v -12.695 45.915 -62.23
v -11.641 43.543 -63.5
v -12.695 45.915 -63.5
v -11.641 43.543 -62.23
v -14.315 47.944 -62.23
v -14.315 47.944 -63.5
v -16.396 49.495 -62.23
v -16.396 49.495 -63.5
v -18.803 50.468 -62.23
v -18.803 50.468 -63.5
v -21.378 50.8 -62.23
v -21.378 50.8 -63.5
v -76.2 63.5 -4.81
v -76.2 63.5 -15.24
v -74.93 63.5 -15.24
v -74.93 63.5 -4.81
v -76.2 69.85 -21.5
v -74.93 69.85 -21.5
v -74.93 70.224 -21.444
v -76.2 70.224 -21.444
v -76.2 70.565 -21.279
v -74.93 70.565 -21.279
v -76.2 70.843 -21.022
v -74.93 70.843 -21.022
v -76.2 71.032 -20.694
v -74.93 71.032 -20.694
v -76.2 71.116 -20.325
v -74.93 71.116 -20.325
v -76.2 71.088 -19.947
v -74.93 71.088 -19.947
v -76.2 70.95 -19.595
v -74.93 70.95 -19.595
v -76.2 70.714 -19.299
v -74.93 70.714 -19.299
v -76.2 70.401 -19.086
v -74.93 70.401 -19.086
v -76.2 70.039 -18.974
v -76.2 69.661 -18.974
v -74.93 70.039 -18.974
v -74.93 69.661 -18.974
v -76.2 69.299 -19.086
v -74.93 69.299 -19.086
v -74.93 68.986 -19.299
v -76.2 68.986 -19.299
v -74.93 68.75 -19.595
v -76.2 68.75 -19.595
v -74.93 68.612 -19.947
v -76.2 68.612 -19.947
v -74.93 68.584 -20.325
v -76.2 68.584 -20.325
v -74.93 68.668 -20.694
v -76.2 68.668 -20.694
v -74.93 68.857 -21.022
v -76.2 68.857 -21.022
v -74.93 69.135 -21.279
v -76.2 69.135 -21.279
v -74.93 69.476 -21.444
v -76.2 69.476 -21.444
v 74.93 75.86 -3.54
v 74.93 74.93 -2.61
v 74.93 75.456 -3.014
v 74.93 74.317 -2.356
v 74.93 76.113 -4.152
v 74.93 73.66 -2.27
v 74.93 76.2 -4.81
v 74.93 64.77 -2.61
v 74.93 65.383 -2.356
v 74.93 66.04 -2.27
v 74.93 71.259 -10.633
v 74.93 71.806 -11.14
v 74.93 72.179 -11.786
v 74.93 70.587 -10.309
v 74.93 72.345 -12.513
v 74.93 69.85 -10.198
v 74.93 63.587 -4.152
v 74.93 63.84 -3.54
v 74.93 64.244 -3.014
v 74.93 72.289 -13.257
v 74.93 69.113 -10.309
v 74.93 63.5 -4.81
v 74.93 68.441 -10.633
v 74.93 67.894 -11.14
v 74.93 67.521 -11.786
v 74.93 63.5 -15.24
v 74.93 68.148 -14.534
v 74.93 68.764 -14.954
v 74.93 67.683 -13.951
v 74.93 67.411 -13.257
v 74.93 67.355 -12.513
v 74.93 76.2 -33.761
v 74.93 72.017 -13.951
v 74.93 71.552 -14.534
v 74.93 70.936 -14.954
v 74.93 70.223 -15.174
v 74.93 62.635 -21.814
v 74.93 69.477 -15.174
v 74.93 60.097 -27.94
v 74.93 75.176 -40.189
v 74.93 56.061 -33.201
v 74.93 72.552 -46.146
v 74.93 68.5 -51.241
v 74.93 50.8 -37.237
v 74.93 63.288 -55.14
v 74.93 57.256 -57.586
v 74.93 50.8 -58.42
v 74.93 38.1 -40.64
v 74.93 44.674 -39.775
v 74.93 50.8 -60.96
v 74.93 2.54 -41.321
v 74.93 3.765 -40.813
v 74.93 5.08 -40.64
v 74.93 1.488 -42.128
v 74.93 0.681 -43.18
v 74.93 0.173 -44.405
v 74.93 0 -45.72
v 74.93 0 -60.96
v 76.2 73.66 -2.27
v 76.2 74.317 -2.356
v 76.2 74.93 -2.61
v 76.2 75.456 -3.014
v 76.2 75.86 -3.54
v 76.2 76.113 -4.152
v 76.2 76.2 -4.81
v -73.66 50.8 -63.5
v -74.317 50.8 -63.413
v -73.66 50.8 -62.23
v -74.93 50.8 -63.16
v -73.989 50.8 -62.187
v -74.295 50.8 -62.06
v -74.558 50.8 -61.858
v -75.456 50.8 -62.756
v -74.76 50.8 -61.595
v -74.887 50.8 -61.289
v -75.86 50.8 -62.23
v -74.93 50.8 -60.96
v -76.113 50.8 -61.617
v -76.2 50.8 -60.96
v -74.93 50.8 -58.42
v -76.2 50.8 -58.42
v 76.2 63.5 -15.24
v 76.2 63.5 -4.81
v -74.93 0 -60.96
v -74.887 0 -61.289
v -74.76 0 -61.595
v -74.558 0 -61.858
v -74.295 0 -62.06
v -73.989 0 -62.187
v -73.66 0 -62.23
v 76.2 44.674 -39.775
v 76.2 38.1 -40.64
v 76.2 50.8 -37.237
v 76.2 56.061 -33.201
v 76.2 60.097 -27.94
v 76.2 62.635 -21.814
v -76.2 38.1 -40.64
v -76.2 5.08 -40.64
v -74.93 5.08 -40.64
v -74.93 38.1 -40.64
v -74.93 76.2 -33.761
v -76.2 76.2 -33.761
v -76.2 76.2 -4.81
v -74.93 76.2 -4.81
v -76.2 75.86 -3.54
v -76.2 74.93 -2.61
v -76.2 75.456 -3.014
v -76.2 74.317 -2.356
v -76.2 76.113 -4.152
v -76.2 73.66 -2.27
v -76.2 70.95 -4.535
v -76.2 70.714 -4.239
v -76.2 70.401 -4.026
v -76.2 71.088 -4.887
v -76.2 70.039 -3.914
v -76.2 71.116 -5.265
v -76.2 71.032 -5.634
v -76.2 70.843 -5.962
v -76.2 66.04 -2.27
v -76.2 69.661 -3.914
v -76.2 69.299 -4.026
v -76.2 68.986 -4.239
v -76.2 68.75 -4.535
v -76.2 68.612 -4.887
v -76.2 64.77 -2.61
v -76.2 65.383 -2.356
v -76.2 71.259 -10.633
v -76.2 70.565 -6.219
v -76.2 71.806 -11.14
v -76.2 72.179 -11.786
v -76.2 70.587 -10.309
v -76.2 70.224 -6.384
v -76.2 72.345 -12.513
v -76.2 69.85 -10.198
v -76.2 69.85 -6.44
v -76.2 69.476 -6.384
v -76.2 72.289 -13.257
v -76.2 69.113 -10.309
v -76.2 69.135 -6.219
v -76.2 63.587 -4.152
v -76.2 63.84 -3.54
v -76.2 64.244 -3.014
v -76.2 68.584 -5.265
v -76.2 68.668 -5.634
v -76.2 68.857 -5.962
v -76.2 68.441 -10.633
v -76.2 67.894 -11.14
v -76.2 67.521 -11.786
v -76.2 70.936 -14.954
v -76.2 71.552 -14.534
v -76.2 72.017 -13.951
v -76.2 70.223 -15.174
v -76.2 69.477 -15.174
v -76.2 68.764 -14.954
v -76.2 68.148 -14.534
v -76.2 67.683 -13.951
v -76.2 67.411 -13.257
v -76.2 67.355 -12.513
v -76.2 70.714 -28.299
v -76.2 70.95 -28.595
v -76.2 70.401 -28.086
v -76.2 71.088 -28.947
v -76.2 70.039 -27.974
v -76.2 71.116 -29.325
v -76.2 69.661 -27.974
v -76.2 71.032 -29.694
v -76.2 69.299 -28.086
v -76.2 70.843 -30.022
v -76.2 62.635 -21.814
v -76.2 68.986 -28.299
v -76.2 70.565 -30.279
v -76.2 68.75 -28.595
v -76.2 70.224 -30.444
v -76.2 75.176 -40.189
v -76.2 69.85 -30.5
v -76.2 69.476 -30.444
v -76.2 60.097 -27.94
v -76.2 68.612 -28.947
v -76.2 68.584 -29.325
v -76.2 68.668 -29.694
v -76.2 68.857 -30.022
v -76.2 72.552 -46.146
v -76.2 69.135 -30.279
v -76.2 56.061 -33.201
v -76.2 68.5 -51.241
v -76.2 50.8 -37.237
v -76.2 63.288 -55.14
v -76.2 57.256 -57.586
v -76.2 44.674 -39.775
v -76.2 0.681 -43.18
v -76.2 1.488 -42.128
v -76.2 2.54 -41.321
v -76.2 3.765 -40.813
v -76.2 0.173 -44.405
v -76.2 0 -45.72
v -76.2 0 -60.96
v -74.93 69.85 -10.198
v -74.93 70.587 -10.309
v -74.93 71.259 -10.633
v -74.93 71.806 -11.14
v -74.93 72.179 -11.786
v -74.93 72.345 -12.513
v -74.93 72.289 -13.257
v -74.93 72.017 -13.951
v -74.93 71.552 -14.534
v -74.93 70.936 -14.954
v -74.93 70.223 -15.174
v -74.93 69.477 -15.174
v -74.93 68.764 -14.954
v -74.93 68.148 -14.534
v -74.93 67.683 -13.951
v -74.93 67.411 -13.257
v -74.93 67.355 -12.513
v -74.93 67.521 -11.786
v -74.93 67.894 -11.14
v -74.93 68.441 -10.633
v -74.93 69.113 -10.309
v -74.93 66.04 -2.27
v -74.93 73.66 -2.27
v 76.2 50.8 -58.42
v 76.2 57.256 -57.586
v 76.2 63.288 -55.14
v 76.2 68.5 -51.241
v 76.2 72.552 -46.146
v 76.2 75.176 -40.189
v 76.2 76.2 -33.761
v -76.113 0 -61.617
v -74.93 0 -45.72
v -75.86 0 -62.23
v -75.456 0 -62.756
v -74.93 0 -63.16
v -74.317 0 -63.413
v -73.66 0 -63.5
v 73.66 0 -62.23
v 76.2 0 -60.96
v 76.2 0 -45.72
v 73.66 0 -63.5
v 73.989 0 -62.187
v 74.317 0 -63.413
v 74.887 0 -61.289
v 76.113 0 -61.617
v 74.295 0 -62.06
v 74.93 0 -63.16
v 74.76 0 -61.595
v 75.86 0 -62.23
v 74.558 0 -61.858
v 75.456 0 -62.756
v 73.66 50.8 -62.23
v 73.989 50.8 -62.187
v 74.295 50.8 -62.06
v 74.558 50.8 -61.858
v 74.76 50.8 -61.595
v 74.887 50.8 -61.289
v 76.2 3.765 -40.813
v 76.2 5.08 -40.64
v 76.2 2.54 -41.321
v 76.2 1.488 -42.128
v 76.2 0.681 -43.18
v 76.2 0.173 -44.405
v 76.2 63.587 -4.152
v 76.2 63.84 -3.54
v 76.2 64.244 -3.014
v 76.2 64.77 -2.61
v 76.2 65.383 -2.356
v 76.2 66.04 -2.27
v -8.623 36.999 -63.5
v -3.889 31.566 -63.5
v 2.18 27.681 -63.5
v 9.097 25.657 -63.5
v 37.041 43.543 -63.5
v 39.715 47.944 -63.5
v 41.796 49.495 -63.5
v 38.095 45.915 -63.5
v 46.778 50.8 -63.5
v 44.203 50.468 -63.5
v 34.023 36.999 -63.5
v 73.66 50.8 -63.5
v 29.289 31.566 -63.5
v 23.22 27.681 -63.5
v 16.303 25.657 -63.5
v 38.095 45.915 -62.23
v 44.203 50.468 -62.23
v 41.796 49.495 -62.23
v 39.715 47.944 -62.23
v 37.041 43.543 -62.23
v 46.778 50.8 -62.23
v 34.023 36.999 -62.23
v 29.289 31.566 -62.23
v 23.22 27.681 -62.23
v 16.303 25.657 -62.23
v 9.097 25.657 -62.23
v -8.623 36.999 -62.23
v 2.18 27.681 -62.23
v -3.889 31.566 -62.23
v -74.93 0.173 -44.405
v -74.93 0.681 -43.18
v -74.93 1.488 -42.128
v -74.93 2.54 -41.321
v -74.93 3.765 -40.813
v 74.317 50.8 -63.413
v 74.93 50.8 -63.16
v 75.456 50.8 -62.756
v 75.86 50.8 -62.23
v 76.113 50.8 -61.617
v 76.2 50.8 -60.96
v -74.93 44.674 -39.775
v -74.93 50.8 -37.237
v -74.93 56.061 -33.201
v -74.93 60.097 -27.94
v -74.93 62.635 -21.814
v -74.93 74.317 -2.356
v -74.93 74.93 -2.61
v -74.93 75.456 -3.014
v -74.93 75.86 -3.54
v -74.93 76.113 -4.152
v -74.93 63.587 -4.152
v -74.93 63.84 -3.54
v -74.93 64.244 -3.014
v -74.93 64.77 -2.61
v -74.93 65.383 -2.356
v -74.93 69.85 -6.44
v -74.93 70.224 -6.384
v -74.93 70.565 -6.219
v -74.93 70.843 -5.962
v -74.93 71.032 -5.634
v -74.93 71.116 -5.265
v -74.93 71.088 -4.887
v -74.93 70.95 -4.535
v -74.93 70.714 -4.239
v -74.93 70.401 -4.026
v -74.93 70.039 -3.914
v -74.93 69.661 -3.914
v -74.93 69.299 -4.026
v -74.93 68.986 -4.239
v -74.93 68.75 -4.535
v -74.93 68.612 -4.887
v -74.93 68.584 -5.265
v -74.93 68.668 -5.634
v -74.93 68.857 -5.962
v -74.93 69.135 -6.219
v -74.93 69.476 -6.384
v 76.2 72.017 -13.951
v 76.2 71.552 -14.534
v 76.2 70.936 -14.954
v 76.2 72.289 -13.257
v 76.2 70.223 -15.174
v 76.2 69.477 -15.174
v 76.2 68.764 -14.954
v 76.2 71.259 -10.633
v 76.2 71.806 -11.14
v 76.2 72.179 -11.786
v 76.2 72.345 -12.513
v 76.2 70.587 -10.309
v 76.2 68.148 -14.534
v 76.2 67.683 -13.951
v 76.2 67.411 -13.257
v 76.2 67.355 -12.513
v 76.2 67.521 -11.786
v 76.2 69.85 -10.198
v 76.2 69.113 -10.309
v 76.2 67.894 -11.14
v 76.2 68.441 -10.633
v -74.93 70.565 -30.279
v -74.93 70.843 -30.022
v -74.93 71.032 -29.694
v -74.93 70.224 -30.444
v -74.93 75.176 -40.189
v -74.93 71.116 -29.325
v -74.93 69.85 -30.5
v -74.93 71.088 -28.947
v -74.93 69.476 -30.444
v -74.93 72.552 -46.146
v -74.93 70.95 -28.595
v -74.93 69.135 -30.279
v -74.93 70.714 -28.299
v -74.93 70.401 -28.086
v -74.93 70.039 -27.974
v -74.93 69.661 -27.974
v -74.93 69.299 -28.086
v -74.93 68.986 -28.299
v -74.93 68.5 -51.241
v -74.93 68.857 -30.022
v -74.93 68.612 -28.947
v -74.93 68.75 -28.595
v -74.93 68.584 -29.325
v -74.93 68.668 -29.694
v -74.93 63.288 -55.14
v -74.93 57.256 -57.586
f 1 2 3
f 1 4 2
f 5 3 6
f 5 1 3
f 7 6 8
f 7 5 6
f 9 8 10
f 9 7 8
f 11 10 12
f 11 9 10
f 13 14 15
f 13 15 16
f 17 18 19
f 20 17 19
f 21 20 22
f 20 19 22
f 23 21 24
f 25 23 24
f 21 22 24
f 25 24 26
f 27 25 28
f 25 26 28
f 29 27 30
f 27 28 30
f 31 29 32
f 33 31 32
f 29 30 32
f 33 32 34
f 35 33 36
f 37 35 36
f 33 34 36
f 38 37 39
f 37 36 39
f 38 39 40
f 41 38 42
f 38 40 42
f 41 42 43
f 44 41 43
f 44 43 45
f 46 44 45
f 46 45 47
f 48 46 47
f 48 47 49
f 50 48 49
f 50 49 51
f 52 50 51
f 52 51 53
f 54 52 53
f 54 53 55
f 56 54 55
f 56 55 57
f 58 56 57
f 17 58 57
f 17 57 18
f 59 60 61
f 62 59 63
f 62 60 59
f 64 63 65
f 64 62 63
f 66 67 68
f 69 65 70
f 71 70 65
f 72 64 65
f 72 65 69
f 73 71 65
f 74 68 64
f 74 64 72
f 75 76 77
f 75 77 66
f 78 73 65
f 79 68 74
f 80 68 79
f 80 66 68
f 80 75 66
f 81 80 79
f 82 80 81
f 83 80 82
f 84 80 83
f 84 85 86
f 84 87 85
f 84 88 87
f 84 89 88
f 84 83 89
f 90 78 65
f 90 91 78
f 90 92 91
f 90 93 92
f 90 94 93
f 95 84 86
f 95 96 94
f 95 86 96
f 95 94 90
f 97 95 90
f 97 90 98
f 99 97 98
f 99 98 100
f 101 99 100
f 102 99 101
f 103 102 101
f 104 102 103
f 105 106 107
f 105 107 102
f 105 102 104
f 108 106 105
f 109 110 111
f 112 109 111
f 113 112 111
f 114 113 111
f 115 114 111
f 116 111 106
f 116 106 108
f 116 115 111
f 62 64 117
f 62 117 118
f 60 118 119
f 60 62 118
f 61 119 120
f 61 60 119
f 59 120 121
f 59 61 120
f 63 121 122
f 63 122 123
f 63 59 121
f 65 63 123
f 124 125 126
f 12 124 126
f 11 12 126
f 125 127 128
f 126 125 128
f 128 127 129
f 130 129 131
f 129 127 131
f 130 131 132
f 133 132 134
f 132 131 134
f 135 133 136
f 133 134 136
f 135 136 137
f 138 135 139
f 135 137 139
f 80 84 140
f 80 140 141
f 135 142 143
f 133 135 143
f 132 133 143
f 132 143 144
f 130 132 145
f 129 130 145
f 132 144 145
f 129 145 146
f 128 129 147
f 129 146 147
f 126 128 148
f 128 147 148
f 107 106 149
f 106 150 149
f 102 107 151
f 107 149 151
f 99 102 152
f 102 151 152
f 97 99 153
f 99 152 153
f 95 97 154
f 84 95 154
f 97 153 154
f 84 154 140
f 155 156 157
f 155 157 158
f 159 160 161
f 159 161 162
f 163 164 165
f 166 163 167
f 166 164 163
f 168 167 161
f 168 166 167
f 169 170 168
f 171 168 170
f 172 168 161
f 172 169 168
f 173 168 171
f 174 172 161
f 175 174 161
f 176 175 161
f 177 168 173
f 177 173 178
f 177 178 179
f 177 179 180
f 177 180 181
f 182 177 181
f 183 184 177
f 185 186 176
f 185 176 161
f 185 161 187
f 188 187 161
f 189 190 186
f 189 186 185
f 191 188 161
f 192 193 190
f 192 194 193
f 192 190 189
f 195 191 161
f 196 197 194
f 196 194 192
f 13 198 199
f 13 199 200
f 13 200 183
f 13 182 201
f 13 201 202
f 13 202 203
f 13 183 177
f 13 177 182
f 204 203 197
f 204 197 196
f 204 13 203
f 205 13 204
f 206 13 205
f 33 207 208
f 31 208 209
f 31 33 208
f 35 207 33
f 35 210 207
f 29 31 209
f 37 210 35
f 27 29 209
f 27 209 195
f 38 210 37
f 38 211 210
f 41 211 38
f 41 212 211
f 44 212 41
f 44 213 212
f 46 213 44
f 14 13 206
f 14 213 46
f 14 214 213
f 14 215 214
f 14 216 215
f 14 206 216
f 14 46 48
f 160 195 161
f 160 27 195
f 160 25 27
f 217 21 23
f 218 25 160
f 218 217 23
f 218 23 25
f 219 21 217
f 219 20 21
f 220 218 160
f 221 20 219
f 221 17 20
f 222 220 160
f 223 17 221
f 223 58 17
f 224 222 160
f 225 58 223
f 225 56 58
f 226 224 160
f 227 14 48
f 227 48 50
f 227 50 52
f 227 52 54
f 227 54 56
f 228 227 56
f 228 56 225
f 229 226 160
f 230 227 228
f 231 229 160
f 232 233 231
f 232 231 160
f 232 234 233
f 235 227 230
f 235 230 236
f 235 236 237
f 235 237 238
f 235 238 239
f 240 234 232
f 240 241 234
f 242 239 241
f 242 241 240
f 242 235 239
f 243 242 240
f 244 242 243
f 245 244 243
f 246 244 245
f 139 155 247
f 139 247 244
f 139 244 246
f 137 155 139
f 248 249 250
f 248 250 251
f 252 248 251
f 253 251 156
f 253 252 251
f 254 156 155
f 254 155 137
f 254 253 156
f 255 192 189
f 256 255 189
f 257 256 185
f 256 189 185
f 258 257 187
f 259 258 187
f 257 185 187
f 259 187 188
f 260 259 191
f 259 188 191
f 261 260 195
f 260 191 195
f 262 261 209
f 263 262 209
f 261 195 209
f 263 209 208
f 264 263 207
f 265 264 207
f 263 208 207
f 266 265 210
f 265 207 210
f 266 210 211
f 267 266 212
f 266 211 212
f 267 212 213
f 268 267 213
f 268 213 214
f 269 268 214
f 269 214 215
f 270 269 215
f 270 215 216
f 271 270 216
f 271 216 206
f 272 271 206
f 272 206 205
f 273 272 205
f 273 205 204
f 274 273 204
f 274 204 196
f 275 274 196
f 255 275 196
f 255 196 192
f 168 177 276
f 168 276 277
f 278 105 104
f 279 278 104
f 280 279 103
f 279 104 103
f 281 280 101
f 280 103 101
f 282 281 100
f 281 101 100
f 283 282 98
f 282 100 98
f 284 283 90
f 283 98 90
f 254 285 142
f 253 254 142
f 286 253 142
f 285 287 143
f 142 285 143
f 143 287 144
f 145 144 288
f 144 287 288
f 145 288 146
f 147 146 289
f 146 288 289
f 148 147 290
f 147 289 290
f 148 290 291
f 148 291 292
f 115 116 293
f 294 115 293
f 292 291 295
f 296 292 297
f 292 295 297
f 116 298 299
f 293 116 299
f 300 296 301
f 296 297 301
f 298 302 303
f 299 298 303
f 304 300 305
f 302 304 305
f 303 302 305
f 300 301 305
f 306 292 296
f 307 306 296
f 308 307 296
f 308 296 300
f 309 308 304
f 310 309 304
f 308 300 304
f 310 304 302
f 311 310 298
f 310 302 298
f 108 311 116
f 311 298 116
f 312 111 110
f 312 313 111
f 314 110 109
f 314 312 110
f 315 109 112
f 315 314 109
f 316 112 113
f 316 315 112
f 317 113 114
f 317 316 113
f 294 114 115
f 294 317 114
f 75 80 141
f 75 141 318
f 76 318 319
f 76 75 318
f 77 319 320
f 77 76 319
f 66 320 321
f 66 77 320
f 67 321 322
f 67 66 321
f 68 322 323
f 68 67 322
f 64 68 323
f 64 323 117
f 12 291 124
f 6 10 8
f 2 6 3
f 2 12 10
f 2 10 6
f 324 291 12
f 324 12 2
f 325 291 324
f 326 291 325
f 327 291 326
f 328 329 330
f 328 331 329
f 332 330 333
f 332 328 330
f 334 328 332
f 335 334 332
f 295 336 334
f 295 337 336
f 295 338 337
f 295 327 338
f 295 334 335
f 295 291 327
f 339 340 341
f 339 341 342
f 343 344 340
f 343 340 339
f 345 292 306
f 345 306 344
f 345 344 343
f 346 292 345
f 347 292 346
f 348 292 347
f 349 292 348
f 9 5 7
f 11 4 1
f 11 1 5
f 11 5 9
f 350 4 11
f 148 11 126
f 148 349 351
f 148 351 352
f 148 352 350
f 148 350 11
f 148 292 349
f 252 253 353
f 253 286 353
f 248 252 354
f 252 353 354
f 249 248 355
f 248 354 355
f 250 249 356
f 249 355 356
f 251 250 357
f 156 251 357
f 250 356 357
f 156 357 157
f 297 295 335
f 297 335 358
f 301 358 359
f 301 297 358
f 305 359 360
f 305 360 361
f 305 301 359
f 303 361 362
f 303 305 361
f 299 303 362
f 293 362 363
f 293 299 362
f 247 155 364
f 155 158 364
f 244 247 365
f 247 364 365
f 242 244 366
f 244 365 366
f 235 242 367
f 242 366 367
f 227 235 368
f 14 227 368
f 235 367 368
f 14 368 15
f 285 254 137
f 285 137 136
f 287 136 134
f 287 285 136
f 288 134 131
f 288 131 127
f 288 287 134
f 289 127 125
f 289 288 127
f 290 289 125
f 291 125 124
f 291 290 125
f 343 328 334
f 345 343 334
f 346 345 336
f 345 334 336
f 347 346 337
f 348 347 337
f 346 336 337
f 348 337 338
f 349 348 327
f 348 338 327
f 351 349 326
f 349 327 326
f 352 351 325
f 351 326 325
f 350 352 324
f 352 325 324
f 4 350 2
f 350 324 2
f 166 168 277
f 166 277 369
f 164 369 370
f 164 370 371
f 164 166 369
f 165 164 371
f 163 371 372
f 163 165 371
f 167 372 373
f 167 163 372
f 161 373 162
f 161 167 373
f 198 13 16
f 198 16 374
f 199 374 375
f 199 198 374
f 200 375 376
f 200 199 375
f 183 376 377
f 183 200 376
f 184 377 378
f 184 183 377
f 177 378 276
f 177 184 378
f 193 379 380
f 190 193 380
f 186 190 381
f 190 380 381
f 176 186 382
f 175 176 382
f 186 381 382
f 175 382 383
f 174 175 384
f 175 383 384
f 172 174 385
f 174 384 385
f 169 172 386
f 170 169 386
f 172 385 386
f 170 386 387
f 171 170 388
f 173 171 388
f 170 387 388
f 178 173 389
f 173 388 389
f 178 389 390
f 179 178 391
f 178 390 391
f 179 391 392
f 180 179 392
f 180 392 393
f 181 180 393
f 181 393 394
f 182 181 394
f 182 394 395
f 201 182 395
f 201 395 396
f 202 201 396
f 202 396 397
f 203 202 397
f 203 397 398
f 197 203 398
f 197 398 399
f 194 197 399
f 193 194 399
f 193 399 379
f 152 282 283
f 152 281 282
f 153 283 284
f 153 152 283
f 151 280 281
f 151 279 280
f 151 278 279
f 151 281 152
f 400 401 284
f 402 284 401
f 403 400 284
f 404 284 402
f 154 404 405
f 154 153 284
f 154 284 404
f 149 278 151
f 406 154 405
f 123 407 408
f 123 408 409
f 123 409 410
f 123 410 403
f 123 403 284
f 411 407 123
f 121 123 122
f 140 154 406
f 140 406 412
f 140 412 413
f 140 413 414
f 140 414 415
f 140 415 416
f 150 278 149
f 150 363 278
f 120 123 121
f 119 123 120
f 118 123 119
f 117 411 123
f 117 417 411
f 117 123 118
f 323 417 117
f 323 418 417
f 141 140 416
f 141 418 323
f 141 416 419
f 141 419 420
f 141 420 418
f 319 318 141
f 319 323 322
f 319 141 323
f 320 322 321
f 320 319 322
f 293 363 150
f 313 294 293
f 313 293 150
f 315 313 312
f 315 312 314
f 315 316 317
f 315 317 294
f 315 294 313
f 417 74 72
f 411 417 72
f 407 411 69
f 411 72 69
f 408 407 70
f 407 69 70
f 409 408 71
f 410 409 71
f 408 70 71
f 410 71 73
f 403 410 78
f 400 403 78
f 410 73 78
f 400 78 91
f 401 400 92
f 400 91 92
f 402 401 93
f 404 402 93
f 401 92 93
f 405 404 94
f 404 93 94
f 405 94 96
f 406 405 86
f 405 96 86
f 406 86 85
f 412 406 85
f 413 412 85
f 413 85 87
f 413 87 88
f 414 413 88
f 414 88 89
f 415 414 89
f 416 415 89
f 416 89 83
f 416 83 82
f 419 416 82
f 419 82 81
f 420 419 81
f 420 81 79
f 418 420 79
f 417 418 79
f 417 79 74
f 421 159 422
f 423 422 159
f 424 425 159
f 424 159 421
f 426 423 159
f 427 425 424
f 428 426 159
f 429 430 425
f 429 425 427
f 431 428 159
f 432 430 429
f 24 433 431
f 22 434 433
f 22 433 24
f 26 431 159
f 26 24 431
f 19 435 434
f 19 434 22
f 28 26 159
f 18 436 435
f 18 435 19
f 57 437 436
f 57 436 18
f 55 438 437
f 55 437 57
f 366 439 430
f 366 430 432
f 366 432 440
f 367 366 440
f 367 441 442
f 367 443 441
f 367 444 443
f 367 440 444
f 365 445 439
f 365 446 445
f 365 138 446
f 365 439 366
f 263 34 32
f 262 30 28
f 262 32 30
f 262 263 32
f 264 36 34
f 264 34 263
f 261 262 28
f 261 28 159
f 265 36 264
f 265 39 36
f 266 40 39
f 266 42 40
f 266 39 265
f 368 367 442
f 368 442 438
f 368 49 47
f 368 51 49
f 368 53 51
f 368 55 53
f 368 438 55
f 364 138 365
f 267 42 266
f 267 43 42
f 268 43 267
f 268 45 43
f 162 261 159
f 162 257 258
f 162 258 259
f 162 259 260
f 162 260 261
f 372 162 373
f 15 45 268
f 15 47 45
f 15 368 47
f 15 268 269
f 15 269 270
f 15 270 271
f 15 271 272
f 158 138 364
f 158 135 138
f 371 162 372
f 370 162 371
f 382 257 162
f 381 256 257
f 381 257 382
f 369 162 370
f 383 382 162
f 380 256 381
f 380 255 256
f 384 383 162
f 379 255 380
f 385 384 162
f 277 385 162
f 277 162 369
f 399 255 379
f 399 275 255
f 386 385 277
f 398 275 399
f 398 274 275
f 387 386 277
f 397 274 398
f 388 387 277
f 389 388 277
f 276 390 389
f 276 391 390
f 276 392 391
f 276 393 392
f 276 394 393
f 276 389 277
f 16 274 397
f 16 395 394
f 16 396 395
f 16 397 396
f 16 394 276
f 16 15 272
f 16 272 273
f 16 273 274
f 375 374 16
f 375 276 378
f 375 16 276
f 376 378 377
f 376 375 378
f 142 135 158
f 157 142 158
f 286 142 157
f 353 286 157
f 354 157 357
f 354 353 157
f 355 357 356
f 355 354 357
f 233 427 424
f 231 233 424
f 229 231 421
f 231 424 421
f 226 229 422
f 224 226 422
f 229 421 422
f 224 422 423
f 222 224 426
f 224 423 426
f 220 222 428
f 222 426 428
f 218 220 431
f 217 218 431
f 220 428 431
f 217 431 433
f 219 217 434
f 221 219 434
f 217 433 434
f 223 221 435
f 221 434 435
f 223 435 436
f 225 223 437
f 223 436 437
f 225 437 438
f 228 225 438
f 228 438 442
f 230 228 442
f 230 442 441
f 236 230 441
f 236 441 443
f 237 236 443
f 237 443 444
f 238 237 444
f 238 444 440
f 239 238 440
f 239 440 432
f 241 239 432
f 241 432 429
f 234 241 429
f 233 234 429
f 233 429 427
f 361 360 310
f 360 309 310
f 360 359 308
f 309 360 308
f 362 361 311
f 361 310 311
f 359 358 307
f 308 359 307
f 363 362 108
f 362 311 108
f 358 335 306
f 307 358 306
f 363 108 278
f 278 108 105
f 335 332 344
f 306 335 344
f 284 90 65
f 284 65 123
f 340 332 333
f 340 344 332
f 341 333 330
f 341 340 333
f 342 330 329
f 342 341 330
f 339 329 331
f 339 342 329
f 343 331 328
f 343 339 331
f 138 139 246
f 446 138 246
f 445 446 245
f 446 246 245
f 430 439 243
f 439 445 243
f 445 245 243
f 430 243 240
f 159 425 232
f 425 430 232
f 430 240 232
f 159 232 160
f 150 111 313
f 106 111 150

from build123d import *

# Parameters (mm, degrees)
BOSS_EXTRUDE1_DEPTH    = 76.2
CONVERT_SOLID1_DEPTH   = 76.2
CONVERT_SOLID1_2_DEPTH = 76.2
SKETCH6_R              = 2.5019
CUT_EXTRUDE1_DEPTH     = 182.836327504
SKETCH8_W              = 48.26
SKETCH8_H              = 63.5
CUT_EXTRUDE2_DEPTH     = 182.836327504
CUT_EXTRUDE4_DEPTH     = 182.836327504
FILLET1_R              = 25.4
FILLET2_R              = 5.08
FILLET3_R              = 5.08
SKETCH12_R             = 1.27
CUT_EXTRUDE5_DEPTH     = 181.773247191
CUT_EXTRUDE7_DEPTH     = 130.115972676
FILLET4_R              = 10.16
CUT_EXTRUDE8_DEPTH     = 182.836327504


# Read off the part's stored shape, not the designer's step: Convert-Solid1
with BuildPart() as part:
    # Sketch1 → Boss-Extrude1 (new body)
    with BuildSketch(Plane(origin=(0, 0, 0), x_dir=(1, 0, 0), z_dir=(0, 1, 0))):
        Polygon((-76.2, -7.62), (-76.2, 63.5), (76.2, 63.5), (76.2, -7.62), (74.93, -7.62), (74.93, 62.23), (-74.93, 62.23), (-74.93, -7.62), align=None)
    extrude(amount=BOSS_EXTRUDE1_DEPTH)

    # Convert-Solid1 outline → Convert-Solid1 (cut)
    with BuildSketch(Plane(origin=(0, 0, 0), x_dir=(1, 0, 0), z_dir=(0, 1, 0))):
        with BuildLine():
            Line((76.2, 63.5), (73.66, 63.5))
            ThreePointArc((73.66, 63.5), (75.456051224, 62.756051224), (76.2, 60.96))
            Line((76.2, 60.96), (76.2, 63.5))
        make_face()
        with BuildLine():
            ThreePointArc((-76.2, 60.96), (-75.456051224, 62.756051224), (-73.66, 63.5))
            Line((-73.66, 63.5), (-76.2, 63.5))
            Line((-76.2, 63.5), (-76.2, 60.96))
        make_face()
    extrude(amount=CONVERT_SOLID1_DEPTH, mode=Mode.SUBTRACT)

    # Convert-Solid1 2 outline → Convert-Solid1 2 (add)
    with BuildSketch(Plane(origin=(0, 0, 0), x_dir=(1, 0, 0), z_dir=(0, 1, 0))):
        with BuildLine():
            Line((74.93, 62.23), (73.66, 62.23))
            ThreePointArc((73.66, 62.23), (74.558025612, 61.858025612), (74.93, 60.96))
            Line((74.93, 60.96), (74.93, 62.23))
        make_face()
        with BuildLine():
            ThreePointArc((-74.93, 60.96), (-74.558025612, 61.858025612), (-73.66, 62.23))
            Line((-73.66, 62.23), (-74.93, 62.23))
            Line((-74.93, 62.23), (-74.93, 60.96))
        make_face()
    extrude(amount=CONVERT_SOLID1_2_DEPTH)

    # Sketch6 → Cut-Extrude1 (cut, through all)
    with BuildSketch(Plane.ZY.offset(76.2)):
        with Locations((-12.7, 69.85)):
            Circle(SKETCH6_R)
    extrude(amount=-CUT_EXTRUDE1_DEPTH, mode=Mode.SUBTRACT)

    # Sketch8 → Cut-Extrude2 (cut, through all)
    with BuildSketch(Plane.ZY.offset(76.2)):
        with Locations((-16.51, 31.75)):
            Rectangle(SKETCH8_W, SKETCH8_H)
    extrude(amount=-CUT_EXTRUDE2_DEPTH, mode=Mode.SUBTRACT)

    # Sketch10 → Cut-Extrude4 (cut, through all)
    with BuildSketch(Plane.ZY.offset(76.2)):
        with BuildLine():
            Line((-60.96, 50.8), (-58.42, 50.8))
            ThreePointArc((-58.42, 50.8), (-51.241342053, 68.500358158), (-33.761315614, 76.2))
            Line((-33.761315614, 76.2), (-33.761315614, 89.340618928))
            Line((-33.761315614, 89.340618928), (-74.373162464, 89.340618928))
            Line((-74.373162464, 89.340618928), (-74.373162464, 50.8))
            Line((-74.373162464, 50.8), (-60.96, 50.8))
        make_face()
    extrude(amount=-CUT_EXTRUDE4_DEPTH, mode=Mode.SUBTRACT)

    # Fillet1
    fillet1_edges = [part.edges().sort_by_distance(p)[0] for p in [
        (75.565, 63.5, -40.64),
        (-75.565, 63.5, -40.64),
    ]]
    fillet(fillet1_edges, radius=FILLET1_R)

    # Fillet2
    fillet2_edges = [part.edges().sort_by_distance(p)[0] for p in [
        (75.565, 76.2, 7.62),
        (-75.565, 76.2, 7.62),
        (75.565, 63.5, 7.62),
        (-75.565, 63.5, 7.62),
    ]]
    fillet(fillet2_edges, radius=FILLET2_R)

    # Fillet3
    fillet3_edges = [part.edges().sort_by_distance(p)[0] for p in [
        (75.565, 0, -40.64),
        (-75.565, 0, -40.64),
    ]]
    fillet(fillet3_edges, radius=FILLET3_R)

    # Sketch12 → Cut-Extrude5 (cut, through all)
    with BuildSketch(Plane(origin=(-74.93, 0, 0), x_dir=(0, 0, -1), z_dir=(1, 0, 0))):
        with Locations((29.23, 69.85)):
            Circle(SKETCH12_R)
        with Locations((20.23, 69.85)):
            Circle(SKETCH12_R)
        with Locations((5.17, 69.85)):
            Circle(SKETCH12_R)
    extrude(amount=-CUT_EXTRUDE5_DEPTH, mode=Mode.SUBTRACT)

    # Sketch14 → Cut-Extrude7 (cut, through all)
    with BuildSketch(Plane(origin=(0, 0, -63.5), x_dir=(-1, 0, 0), z_dir=(0, 0, -1))):
        with BuildLine():
            Line((12.7, 50.8), (1.071870333, 91.408147598))
            Line((1.071870333, 91.408147598), (-38.1, 50.8))
            ThreePointArc((-38.1, 50.8), (-12.7, 25.4), (12.7, 50.8))
        make_face()
    extrude(amount=-CUT_EXTRUDE7_DEPTH, mode=Mode.SUBTRACT)

    # Fillet4
    fillet4_edges = [part.edges().sort_by_distance(p)[0] for p in [
        (-12.7, 50.8, -62.865),
        (38.1, 50.8, -62.865),
    ]]
    fillet(fillet4_edges, radius=FILLET4_R)

    # Sketch15 → Cut-Extrude8 (cut, through all)
    with BuildSketch(Plane.ZY.offset(76.2)):
        with BuildLine():
            Line((-5.770454057, 63.5), (-4.809684624, 63.5))
            ThreePointArc((-4.809684624, 63.5), (-3.0136334, 64.243948776), (-2.269684624, 66.04))
            Line((-2.269684624, 66.04), (-2.269684624, 73.66))
            ThreePointArc((-2.269684624, 73.66), (-3.0136334, 75.456051224), (-4.809684624, 76.2))
            Line((-4.809684624, 76.2), (-5.770454057, 76.2))
            Line((-5.770454057, 76.2), (-1.678645629, 79.389355871))
            Line((-1.678645629, 79.389355871), (6.777461653, 78.341276838))
            Line((6.777461653, 78.341276838), (9.50563074, 68.386937654))
            Line((9.50563074, 68.386937654), (3.09513087, 60.066927184))
            Line((3.09513087, 60.066927184), (-5.770454057, 60.066927184))
            Line((-5.770454057, 60.066927184), (-5.770454057, 63.5))
        make_face()
    extrude(amount=-CUT_EXTRUDE8_DEPTH, mode=Mode.SUBTRACT)


solid = part.part
